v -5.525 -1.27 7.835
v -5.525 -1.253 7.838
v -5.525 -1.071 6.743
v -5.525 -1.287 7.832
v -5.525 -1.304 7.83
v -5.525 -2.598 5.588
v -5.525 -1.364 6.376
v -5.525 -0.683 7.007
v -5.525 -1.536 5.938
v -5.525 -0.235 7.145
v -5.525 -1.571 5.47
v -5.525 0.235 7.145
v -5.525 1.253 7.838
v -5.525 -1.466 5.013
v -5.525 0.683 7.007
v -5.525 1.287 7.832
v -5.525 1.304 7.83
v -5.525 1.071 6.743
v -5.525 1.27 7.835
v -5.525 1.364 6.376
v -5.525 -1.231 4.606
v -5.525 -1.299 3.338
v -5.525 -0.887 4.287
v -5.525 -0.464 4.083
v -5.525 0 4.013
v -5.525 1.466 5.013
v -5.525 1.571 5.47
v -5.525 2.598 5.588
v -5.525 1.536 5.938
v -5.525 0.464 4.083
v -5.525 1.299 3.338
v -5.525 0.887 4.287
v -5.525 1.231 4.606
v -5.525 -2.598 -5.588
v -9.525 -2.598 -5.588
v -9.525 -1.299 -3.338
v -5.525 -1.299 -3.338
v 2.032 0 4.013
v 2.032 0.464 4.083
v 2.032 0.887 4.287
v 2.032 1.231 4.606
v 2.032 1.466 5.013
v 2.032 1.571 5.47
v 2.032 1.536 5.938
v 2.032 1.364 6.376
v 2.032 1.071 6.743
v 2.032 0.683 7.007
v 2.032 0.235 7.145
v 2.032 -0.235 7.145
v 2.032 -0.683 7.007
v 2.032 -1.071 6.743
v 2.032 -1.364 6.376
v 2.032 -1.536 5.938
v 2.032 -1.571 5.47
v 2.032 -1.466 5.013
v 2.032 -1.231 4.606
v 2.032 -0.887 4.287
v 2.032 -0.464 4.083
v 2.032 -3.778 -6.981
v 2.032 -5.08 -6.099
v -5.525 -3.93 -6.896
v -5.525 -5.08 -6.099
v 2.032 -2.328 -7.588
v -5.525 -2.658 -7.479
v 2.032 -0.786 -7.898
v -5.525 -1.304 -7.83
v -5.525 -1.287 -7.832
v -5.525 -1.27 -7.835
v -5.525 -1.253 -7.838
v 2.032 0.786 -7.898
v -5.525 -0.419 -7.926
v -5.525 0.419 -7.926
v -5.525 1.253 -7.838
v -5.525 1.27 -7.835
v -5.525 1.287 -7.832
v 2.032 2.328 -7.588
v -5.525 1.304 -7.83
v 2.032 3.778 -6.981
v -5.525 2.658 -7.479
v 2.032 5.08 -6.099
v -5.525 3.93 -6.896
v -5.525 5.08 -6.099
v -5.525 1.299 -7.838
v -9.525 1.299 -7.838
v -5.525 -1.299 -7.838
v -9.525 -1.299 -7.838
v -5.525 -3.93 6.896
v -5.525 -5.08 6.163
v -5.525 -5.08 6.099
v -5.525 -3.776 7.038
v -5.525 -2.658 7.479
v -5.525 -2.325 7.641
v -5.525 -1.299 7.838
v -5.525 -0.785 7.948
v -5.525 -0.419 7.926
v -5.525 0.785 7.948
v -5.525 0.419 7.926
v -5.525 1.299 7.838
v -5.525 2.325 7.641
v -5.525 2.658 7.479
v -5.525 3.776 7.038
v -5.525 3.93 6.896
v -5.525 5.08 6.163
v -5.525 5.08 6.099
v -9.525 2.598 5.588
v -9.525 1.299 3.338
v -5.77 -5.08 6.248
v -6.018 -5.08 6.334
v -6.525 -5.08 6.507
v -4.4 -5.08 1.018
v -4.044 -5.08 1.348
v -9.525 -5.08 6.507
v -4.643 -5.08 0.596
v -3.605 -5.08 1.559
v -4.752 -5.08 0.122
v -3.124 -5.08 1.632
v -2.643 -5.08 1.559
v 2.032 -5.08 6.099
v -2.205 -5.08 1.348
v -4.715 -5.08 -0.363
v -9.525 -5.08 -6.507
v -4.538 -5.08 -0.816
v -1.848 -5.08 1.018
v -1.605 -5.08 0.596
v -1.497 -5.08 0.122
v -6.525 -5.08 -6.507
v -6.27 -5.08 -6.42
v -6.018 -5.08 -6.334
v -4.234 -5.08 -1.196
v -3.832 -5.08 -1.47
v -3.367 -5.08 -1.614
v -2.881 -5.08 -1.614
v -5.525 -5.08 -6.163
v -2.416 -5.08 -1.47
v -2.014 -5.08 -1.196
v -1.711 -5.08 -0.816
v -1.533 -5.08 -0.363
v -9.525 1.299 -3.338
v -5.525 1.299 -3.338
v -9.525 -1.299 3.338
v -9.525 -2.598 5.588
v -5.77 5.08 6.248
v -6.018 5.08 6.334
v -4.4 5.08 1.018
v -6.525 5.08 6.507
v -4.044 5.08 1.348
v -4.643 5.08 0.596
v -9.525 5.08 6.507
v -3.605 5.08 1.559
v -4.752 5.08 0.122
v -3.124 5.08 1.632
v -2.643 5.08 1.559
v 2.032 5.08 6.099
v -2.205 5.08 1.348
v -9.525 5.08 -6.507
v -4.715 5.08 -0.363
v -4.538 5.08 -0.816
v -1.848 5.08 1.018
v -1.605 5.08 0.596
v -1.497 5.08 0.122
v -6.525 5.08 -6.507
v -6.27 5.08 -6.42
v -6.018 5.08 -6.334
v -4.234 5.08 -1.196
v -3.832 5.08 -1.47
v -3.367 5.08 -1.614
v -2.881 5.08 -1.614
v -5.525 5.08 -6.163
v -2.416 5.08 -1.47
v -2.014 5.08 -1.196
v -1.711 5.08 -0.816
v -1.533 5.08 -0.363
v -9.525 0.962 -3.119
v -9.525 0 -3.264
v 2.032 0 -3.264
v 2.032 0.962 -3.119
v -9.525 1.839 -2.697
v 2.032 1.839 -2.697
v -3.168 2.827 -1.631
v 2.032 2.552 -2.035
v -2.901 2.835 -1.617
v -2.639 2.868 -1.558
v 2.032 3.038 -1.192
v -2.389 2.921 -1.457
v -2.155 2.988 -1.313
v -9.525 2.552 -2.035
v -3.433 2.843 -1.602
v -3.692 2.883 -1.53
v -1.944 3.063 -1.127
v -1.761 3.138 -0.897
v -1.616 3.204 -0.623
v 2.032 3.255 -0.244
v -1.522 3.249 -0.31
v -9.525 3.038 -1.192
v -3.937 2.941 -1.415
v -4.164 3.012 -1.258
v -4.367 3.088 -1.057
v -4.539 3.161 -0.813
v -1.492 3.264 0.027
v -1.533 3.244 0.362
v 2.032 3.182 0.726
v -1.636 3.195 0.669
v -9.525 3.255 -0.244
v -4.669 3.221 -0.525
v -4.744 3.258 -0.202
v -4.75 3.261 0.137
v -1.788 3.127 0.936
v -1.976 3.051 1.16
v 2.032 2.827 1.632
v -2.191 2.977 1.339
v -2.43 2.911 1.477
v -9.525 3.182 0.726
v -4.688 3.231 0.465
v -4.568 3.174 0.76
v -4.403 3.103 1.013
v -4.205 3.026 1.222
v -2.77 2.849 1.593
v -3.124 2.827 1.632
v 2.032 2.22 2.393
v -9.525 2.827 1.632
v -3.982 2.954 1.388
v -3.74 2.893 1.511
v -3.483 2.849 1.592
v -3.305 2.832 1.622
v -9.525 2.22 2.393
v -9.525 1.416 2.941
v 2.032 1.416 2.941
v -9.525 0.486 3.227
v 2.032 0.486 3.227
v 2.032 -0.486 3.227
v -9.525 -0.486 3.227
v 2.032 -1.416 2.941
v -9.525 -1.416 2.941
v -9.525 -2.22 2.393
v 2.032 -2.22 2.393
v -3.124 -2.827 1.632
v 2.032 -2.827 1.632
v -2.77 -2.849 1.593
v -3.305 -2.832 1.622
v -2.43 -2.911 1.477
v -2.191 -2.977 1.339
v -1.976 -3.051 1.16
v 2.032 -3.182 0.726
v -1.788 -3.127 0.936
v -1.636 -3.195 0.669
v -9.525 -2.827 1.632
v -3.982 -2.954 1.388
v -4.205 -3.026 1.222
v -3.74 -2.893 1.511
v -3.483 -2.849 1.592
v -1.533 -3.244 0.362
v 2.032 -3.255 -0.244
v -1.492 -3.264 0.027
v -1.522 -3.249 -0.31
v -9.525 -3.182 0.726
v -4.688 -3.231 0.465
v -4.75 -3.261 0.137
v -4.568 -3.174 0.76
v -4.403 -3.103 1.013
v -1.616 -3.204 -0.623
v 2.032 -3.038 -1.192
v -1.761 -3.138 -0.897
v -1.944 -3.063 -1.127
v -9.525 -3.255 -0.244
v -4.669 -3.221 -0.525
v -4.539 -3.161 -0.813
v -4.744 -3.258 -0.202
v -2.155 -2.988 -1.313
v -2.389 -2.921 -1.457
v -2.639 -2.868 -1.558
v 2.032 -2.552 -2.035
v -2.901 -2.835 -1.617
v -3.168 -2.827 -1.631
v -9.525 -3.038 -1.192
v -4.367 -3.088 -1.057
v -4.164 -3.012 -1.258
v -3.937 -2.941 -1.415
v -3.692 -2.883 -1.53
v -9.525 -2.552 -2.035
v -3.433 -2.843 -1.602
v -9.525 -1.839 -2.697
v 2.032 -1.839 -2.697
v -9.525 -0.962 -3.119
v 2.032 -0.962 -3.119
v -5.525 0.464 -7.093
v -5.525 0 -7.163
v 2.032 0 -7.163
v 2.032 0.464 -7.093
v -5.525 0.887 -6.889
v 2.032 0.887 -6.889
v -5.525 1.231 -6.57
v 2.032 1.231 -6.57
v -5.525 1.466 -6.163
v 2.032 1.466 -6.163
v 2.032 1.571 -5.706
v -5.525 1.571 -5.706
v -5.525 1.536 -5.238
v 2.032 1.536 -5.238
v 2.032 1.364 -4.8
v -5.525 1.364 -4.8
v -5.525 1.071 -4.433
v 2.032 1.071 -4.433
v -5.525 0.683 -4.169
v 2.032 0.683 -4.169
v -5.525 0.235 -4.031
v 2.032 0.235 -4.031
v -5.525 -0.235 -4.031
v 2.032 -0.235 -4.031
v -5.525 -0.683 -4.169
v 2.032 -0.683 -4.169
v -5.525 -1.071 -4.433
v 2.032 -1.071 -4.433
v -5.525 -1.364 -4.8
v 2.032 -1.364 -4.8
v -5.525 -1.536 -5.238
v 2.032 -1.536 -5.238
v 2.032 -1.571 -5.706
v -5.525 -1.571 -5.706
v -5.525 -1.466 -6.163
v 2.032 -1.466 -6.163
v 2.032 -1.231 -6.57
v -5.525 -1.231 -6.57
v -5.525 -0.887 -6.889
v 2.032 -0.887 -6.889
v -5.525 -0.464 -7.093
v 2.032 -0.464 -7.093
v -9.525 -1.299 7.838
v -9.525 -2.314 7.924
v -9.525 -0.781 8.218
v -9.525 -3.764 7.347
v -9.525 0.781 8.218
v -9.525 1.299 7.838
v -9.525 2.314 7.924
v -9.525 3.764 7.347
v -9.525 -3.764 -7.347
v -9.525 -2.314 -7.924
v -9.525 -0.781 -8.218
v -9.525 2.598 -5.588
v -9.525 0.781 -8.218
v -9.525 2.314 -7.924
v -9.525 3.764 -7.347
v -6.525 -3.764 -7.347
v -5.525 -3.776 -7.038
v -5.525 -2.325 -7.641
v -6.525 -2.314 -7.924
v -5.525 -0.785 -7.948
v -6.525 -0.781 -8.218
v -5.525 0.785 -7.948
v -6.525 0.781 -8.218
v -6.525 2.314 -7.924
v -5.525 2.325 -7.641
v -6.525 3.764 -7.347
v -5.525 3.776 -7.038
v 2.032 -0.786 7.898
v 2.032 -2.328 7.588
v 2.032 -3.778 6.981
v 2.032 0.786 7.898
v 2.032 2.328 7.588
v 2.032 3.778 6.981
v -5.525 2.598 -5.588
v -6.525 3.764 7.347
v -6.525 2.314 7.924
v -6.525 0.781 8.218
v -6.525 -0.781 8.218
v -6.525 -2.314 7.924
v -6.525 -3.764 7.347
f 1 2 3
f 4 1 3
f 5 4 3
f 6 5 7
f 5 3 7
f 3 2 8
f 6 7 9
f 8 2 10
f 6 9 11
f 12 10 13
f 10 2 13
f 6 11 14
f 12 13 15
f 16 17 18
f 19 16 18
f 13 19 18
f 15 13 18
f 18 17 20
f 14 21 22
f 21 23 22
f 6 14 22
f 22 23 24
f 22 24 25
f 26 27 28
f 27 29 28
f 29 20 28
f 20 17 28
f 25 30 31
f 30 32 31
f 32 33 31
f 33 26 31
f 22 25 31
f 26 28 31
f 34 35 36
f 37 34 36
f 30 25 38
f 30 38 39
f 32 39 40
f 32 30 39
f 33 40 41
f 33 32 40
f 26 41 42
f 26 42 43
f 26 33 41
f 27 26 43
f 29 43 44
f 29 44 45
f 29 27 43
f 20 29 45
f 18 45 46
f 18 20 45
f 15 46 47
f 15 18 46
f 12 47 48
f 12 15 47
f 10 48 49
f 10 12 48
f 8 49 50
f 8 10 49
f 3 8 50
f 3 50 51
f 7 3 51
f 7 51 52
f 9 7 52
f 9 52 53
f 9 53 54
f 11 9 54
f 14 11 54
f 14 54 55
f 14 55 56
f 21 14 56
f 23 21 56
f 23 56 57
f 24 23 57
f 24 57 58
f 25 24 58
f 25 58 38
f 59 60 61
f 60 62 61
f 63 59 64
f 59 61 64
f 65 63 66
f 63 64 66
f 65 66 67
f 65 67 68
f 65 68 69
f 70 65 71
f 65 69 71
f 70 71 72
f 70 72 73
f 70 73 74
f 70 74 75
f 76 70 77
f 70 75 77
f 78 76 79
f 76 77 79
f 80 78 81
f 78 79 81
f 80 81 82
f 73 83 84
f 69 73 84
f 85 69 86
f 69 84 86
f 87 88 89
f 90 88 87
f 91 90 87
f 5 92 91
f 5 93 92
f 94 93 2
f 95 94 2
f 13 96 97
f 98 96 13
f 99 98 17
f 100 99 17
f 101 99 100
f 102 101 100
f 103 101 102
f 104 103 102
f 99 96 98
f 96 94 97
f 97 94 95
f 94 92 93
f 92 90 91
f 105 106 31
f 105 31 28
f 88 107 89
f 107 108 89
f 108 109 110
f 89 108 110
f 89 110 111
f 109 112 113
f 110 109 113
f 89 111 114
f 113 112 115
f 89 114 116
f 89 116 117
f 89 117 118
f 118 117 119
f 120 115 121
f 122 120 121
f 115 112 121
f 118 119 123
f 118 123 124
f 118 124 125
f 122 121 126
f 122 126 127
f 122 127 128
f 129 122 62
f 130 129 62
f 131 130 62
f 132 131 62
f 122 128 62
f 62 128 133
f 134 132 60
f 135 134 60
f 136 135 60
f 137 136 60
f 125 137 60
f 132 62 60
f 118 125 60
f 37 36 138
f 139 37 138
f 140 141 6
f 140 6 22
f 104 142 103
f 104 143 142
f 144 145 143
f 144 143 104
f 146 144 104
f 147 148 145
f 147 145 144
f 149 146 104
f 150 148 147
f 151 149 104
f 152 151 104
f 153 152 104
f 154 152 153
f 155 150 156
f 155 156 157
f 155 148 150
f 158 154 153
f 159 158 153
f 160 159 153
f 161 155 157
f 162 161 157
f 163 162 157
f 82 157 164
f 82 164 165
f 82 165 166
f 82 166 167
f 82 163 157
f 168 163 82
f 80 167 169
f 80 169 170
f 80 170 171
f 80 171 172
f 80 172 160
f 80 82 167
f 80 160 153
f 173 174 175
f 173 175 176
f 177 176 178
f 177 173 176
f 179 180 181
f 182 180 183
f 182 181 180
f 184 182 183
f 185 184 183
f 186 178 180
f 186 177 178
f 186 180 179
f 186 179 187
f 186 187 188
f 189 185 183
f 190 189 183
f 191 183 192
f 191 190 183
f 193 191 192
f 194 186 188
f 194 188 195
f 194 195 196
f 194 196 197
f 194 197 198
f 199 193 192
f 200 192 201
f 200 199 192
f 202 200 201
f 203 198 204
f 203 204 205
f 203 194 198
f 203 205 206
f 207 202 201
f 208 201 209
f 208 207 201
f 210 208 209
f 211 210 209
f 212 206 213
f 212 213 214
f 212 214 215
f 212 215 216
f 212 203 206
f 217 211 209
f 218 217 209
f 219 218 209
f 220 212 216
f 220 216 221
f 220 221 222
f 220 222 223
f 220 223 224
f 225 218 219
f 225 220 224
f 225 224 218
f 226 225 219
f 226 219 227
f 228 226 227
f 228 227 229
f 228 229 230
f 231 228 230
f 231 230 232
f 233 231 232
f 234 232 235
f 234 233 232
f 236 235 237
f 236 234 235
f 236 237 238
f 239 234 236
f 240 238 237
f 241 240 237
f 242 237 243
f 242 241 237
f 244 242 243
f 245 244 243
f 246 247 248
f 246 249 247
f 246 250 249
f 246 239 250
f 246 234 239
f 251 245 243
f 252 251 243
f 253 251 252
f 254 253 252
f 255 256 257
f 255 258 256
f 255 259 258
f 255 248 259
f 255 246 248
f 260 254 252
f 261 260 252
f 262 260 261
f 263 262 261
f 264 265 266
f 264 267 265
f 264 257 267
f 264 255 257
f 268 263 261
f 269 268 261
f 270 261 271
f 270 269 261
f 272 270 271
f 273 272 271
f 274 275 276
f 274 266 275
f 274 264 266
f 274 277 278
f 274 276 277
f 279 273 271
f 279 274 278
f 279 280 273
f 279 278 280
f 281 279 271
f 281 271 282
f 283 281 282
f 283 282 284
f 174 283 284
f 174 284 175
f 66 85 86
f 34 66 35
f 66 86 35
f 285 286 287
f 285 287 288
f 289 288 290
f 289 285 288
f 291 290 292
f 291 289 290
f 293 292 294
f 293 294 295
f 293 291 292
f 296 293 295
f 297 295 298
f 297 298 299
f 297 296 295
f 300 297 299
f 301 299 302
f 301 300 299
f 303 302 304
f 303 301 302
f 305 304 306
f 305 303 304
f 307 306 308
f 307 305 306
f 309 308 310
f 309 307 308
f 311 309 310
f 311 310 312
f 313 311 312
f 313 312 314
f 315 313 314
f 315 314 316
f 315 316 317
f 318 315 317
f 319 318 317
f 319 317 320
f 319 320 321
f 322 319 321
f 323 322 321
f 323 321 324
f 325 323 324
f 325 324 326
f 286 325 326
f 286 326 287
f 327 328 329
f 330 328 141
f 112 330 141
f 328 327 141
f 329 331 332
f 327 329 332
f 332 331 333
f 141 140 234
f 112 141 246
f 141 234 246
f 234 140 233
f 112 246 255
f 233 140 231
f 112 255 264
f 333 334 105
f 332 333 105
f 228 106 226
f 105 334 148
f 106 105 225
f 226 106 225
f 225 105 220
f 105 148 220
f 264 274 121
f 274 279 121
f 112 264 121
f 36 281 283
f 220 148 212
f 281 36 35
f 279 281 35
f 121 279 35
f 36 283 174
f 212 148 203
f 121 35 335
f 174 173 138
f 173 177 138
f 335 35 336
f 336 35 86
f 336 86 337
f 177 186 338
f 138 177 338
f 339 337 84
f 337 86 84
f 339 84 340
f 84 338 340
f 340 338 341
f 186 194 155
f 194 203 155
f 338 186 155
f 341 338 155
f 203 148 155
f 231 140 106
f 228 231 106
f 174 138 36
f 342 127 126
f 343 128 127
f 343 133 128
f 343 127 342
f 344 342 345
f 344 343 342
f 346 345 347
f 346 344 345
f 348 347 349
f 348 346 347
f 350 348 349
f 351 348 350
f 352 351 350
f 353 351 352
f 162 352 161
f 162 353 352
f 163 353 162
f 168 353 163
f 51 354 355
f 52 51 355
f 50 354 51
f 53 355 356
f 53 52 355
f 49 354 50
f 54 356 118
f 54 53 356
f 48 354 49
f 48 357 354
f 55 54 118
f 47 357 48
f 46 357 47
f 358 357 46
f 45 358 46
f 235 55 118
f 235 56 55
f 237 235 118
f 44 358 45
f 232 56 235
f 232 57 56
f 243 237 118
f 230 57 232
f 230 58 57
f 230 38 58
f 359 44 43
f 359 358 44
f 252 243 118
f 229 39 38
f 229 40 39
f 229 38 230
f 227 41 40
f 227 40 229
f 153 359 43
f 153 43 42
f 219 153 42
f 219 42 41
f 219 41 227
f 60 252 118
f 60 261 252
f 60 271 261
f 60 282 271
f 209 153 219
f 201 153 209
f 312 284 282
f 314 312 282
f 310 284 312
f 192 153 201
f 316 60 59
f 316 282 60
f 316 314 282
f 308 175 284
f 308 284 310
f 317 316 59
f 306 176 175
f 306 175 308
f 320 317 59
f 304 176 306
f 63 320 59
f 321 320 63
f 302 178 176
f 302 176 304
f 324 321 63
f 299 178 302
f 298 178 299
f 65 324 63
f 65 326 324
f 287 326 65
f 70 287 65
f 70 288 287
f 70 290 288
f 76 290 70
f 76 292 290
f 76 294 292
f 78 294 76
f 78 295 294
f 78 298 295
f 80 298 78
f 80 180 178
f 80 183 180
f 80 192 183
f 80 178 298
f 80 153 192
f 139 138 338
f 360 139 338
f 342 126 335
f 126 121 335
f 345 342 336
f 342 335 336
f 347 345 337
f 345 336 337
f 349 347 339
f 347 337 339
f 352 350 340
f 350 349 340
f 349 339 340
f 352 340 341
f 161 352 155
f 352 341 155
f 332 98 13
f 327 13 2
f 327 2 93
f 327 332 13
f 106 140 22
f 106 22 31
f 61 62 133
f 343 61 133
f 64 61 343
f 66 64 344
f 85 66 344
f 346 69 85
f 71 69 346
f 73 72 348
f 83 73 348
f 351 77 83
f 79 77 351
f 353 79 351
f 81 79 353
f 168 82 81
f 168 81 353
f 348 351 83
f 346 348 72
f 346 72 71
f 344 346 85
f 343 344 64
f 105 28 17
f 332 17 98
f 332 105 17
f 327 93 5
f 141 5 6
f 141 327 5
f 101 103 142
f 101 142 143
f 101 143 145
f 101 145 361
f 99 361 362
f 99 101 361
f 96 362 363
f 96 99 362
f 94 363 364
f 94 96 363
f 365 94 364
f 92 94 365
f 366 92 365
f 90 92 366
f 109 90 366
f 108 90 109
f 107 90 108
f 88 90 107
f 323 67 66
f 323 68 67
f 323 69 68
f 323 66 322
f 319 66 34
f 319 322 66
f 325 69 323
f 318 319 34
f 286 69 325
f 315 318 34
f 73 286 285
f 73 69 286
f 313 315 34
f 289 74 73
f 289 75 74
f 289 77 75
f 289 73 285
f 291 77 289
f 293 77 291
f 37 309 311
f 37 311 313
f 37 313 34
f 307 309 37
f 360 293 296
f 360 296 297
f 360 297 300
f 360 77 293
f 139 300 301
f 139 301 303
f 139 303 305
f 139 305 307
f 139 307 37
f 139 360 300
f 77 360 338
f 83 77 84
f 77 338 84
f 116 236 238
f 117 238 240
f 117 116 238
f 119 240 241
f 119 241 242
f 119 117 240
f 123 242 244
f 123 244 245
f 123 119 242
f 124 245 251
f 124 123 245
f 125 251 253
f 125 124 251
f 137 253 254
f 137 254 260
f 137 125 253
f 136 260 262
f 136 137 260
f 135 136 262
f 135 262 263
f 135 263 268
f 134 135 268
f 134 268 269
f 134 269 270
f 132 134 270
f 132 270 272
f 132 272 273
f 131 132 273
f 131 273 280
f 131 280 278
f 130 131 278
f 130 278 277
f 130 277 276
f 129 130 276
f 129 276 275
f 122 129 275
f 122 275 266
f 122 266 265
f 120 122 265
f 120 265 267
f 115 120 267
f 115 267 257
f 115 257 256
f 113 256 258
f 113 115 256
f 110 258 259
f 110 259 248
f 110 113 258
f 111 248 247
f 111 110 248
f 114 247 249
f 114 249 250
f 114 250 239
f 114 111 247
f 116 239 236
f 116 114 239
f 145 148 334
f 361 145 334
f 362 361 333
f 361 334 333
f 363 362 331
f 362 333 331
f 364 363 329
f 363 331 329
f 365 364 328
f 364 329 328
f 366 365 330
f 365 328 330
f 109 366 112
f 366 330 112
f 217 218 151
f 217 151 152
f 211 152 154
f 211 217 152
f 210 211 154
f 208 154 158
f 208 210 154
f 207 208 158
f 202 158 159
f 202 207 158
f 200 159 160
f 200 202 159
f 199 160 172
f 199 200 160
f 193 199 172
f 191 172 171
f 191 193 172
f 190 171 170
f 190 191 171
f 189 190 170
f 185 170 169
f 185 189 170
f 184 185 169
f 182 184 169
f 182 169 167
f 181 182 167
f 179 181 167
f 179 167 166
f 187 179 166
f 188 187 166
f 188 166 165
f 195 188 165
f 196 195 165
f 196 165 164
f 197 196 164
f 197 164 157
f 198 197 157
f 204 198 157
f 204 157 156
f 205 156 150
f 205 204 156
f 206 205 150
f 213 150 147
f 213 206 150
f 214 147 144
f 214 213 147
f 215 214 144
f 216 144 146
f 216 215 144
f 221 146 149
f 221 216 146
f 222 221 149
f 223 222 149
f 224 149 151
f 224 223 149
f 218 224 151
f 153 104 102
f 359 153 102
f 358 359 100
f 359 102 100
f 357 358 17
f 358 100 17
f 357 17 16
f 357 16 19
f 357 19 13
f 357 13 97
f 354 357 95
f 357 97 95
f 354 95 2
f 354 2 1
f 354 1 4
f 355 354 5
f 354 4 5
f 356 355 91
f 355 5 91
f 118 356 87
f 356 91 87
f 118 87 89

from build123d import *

# Parameters (mm, degrees)
SKETCH1_R                 = 7.9375
SKETCH1_R_2               = 1.575
SKETCH1_R_3               = 3.2639
INNER_SIDE_EXTRUDE_DEPTH  = 2.032
OUTER_START               = -9.525
SKETCH1_3_R               = 7.9375
SKETCH1_3_R_2             = 1.575
SKETCH1_3_R_3             = 3.2639
OUTER_SIDE_EXTRUDE_DEPTH  = 9.525
CLEVIS_PIN_CUT_DEPTH      = 15.721869362
CLEVIS_PIN_CUT_DEPTH_BACK = 15.721869362
SKETCH2_R                 = 1.63195
SKETCH3_R                 = 8.255
SKETCH3_R_2               = 7.9375
BOSS_EXTRUDE1_DEPTH       = 4
SKETCH4_R                 = 1.575
CUT_EXTRUDE1_DEPTH        = 4
CHAMFER1_SIZE             = 1
CHAMFER1_SIZE2            = 0.267949192
CUT_EXTRUDE2_DEPTH        = 16.067039421
CUT_EXTRUDE2_DEPTH_BACK   = 16.067039421
SKETCH5_W                 = 16.51
SKETCH5_H                 = 4.312866645


with BuildPart() as part:
    # Sketch1 → Inner Side Extrude (new body)
    with BuildSketch(Plane(origin=(0, 0, 0), x_dir=(0, 0, -1), z_dir=(1, 0, 0))):
        Circle(SKETCH1_R)
        with Locations((5.588, 0)):
            Circle(SKETCH1_R_2, mode=Mode.SUBTRACT)
        with Locations((-5.588, 0)):
            Circle(SKETCH1_R_2, mode=Mode.SUBTRACT)
        Circle(SKETCH1_R_3, mode=Mode.SUBTRACT)
    extrude(amount=INNER_SIDE_EXTRUDE_DEPTH)

    # Sketch1<3> → Outer Side Extrude (add)
    with BuildSketch(Plane(origin=(0, 0, 0), x_dir=(0, 0, -1), z_dir=(1, 0, 0)).offset(OUTER_START)):
        Circle(SKETCH1_3_R)
        with Locations((5.588, 0)):
            Circle(SKETCH1_3_R_2, mode=Mode.SUBTRACT)
        with Locations((-5.588, 0)):
            Circle(SKETCH1_3_R_2, mode=Mode.SUBTRACT)
        Circle(SKETCH1_3_R_3, mode=Mode.SUBTRACT)
    extrude(amount=OUTER_SIDE_EXTRUDE_DEPTH)

    # Sketch2 → Clevis Pin Cut (cut, two sides: drawn at the far end of the back side and taken through both)
    with BuildSketch(Plane(origin=(0, 0, 0), x_dir=(1, 0, 0), z_dir=(0, 1, 0)).offset(-CLEVIS_PIN_CUT_DEPTH_BACK)):
        with Locations((-3.1242, 0)):
            Circle(SKETCH2_R)
    extrude(amount=CLEVIS_PIN_CUT_DEPTH + CLEVIS_PIN_CUT_DEPTH_BACK, mode=Mode.SUBTRACT)

    # Sketch3 → Boss-Extrude1 (add)
    with BuildSketch(Plane(origin=(-9.525, 0, 0), x_dir=(0, 0, -1), z_dir=(1, 0, 0))):
        Circle(SKETCH3_R)
        Circle(SKETCH3_R_2, mode=Mode.SUBTRACT)
    extrude(amount=BOSS_EXTRUDE1_DEPTH)

    # Sketch4 → Cut-Extrude1 (cut)
    # profile 1 of 2: a face of its own
    with BuildSketch(Plane(origin=(-9.525, 0, 0), x_dir=(0, 0, -1), z_dir=(1, 0, 0))):
        Polygon((-3.338, 1.299038106), (-5.588, 2.598076211), (-7.838, 1.299038106), (-7.838, -1.299038106), (-5.588, -2.598076211), (-3.338, -1.299038106), align=None)
        with Locations((-5.588, 0)):
            Circle(SKETCH4_R, mode=Mode.SUBTRACT)
    # profile 2 of 2: a face of its own
    with BuildSketch(Plane(origin=(-9.525, 0, 0), x_dir=(0, 0, -1), z_dir=(1, 0, 0))):
        Polygon((5.588, 2.598076211), (3.338, 1.299038106), (3.338, -1.299038106), (5.588, -2.598076211), (7.838, -1.299038106), (7.838, 1.299038106), align=None)
        with Locations((5.588, 0)):
            Circle(SKETCH4_R, mode=Mode.SUBTRACT)
    extrude(amount=CUT_EXTRUDE1_DEPTH, mode=Mode.SUBTRACT)

    # Chamfer1
    chamfer1_edges = [part.edges().sort_by_distance(p)[0] for p in [
        (-5.525, 0, 8.255),
    ]]
    chamfer1_side = [part.faces().sort_by_distance(p)[0] for p in [
        (-7.525, 0, 8.255),
    ]]
    chamfer(chamfer1_edges, length=CHAMFER1_SIZE, length2=CHAMFER1_SIZE2, reference=chamfer1_side[0])

    # Sketch5 → Cut-Extrude2 (cut, two sides: drawn at the far end of the back side and taken through both)
    with BuildSketch(Plane.XY.offset(-CUT_EXTRUDE2_DEPTH_BACK)):
        with Locations((-3.1242, 7.236433322)):
            Rectangle(SKETCH5_W, SKETCH5_H)
        with Locations((-3.1242, -7.236433322)):
            Rectangle(SKETCH5_W, SKETCH5_H)
    extrude(amount=CUT_EXTRUDE2_DEPTH + CUT_EXTRUDE2_DEPTH_BACK, mode=Mode.SUBTRACT)


solid = part.part
